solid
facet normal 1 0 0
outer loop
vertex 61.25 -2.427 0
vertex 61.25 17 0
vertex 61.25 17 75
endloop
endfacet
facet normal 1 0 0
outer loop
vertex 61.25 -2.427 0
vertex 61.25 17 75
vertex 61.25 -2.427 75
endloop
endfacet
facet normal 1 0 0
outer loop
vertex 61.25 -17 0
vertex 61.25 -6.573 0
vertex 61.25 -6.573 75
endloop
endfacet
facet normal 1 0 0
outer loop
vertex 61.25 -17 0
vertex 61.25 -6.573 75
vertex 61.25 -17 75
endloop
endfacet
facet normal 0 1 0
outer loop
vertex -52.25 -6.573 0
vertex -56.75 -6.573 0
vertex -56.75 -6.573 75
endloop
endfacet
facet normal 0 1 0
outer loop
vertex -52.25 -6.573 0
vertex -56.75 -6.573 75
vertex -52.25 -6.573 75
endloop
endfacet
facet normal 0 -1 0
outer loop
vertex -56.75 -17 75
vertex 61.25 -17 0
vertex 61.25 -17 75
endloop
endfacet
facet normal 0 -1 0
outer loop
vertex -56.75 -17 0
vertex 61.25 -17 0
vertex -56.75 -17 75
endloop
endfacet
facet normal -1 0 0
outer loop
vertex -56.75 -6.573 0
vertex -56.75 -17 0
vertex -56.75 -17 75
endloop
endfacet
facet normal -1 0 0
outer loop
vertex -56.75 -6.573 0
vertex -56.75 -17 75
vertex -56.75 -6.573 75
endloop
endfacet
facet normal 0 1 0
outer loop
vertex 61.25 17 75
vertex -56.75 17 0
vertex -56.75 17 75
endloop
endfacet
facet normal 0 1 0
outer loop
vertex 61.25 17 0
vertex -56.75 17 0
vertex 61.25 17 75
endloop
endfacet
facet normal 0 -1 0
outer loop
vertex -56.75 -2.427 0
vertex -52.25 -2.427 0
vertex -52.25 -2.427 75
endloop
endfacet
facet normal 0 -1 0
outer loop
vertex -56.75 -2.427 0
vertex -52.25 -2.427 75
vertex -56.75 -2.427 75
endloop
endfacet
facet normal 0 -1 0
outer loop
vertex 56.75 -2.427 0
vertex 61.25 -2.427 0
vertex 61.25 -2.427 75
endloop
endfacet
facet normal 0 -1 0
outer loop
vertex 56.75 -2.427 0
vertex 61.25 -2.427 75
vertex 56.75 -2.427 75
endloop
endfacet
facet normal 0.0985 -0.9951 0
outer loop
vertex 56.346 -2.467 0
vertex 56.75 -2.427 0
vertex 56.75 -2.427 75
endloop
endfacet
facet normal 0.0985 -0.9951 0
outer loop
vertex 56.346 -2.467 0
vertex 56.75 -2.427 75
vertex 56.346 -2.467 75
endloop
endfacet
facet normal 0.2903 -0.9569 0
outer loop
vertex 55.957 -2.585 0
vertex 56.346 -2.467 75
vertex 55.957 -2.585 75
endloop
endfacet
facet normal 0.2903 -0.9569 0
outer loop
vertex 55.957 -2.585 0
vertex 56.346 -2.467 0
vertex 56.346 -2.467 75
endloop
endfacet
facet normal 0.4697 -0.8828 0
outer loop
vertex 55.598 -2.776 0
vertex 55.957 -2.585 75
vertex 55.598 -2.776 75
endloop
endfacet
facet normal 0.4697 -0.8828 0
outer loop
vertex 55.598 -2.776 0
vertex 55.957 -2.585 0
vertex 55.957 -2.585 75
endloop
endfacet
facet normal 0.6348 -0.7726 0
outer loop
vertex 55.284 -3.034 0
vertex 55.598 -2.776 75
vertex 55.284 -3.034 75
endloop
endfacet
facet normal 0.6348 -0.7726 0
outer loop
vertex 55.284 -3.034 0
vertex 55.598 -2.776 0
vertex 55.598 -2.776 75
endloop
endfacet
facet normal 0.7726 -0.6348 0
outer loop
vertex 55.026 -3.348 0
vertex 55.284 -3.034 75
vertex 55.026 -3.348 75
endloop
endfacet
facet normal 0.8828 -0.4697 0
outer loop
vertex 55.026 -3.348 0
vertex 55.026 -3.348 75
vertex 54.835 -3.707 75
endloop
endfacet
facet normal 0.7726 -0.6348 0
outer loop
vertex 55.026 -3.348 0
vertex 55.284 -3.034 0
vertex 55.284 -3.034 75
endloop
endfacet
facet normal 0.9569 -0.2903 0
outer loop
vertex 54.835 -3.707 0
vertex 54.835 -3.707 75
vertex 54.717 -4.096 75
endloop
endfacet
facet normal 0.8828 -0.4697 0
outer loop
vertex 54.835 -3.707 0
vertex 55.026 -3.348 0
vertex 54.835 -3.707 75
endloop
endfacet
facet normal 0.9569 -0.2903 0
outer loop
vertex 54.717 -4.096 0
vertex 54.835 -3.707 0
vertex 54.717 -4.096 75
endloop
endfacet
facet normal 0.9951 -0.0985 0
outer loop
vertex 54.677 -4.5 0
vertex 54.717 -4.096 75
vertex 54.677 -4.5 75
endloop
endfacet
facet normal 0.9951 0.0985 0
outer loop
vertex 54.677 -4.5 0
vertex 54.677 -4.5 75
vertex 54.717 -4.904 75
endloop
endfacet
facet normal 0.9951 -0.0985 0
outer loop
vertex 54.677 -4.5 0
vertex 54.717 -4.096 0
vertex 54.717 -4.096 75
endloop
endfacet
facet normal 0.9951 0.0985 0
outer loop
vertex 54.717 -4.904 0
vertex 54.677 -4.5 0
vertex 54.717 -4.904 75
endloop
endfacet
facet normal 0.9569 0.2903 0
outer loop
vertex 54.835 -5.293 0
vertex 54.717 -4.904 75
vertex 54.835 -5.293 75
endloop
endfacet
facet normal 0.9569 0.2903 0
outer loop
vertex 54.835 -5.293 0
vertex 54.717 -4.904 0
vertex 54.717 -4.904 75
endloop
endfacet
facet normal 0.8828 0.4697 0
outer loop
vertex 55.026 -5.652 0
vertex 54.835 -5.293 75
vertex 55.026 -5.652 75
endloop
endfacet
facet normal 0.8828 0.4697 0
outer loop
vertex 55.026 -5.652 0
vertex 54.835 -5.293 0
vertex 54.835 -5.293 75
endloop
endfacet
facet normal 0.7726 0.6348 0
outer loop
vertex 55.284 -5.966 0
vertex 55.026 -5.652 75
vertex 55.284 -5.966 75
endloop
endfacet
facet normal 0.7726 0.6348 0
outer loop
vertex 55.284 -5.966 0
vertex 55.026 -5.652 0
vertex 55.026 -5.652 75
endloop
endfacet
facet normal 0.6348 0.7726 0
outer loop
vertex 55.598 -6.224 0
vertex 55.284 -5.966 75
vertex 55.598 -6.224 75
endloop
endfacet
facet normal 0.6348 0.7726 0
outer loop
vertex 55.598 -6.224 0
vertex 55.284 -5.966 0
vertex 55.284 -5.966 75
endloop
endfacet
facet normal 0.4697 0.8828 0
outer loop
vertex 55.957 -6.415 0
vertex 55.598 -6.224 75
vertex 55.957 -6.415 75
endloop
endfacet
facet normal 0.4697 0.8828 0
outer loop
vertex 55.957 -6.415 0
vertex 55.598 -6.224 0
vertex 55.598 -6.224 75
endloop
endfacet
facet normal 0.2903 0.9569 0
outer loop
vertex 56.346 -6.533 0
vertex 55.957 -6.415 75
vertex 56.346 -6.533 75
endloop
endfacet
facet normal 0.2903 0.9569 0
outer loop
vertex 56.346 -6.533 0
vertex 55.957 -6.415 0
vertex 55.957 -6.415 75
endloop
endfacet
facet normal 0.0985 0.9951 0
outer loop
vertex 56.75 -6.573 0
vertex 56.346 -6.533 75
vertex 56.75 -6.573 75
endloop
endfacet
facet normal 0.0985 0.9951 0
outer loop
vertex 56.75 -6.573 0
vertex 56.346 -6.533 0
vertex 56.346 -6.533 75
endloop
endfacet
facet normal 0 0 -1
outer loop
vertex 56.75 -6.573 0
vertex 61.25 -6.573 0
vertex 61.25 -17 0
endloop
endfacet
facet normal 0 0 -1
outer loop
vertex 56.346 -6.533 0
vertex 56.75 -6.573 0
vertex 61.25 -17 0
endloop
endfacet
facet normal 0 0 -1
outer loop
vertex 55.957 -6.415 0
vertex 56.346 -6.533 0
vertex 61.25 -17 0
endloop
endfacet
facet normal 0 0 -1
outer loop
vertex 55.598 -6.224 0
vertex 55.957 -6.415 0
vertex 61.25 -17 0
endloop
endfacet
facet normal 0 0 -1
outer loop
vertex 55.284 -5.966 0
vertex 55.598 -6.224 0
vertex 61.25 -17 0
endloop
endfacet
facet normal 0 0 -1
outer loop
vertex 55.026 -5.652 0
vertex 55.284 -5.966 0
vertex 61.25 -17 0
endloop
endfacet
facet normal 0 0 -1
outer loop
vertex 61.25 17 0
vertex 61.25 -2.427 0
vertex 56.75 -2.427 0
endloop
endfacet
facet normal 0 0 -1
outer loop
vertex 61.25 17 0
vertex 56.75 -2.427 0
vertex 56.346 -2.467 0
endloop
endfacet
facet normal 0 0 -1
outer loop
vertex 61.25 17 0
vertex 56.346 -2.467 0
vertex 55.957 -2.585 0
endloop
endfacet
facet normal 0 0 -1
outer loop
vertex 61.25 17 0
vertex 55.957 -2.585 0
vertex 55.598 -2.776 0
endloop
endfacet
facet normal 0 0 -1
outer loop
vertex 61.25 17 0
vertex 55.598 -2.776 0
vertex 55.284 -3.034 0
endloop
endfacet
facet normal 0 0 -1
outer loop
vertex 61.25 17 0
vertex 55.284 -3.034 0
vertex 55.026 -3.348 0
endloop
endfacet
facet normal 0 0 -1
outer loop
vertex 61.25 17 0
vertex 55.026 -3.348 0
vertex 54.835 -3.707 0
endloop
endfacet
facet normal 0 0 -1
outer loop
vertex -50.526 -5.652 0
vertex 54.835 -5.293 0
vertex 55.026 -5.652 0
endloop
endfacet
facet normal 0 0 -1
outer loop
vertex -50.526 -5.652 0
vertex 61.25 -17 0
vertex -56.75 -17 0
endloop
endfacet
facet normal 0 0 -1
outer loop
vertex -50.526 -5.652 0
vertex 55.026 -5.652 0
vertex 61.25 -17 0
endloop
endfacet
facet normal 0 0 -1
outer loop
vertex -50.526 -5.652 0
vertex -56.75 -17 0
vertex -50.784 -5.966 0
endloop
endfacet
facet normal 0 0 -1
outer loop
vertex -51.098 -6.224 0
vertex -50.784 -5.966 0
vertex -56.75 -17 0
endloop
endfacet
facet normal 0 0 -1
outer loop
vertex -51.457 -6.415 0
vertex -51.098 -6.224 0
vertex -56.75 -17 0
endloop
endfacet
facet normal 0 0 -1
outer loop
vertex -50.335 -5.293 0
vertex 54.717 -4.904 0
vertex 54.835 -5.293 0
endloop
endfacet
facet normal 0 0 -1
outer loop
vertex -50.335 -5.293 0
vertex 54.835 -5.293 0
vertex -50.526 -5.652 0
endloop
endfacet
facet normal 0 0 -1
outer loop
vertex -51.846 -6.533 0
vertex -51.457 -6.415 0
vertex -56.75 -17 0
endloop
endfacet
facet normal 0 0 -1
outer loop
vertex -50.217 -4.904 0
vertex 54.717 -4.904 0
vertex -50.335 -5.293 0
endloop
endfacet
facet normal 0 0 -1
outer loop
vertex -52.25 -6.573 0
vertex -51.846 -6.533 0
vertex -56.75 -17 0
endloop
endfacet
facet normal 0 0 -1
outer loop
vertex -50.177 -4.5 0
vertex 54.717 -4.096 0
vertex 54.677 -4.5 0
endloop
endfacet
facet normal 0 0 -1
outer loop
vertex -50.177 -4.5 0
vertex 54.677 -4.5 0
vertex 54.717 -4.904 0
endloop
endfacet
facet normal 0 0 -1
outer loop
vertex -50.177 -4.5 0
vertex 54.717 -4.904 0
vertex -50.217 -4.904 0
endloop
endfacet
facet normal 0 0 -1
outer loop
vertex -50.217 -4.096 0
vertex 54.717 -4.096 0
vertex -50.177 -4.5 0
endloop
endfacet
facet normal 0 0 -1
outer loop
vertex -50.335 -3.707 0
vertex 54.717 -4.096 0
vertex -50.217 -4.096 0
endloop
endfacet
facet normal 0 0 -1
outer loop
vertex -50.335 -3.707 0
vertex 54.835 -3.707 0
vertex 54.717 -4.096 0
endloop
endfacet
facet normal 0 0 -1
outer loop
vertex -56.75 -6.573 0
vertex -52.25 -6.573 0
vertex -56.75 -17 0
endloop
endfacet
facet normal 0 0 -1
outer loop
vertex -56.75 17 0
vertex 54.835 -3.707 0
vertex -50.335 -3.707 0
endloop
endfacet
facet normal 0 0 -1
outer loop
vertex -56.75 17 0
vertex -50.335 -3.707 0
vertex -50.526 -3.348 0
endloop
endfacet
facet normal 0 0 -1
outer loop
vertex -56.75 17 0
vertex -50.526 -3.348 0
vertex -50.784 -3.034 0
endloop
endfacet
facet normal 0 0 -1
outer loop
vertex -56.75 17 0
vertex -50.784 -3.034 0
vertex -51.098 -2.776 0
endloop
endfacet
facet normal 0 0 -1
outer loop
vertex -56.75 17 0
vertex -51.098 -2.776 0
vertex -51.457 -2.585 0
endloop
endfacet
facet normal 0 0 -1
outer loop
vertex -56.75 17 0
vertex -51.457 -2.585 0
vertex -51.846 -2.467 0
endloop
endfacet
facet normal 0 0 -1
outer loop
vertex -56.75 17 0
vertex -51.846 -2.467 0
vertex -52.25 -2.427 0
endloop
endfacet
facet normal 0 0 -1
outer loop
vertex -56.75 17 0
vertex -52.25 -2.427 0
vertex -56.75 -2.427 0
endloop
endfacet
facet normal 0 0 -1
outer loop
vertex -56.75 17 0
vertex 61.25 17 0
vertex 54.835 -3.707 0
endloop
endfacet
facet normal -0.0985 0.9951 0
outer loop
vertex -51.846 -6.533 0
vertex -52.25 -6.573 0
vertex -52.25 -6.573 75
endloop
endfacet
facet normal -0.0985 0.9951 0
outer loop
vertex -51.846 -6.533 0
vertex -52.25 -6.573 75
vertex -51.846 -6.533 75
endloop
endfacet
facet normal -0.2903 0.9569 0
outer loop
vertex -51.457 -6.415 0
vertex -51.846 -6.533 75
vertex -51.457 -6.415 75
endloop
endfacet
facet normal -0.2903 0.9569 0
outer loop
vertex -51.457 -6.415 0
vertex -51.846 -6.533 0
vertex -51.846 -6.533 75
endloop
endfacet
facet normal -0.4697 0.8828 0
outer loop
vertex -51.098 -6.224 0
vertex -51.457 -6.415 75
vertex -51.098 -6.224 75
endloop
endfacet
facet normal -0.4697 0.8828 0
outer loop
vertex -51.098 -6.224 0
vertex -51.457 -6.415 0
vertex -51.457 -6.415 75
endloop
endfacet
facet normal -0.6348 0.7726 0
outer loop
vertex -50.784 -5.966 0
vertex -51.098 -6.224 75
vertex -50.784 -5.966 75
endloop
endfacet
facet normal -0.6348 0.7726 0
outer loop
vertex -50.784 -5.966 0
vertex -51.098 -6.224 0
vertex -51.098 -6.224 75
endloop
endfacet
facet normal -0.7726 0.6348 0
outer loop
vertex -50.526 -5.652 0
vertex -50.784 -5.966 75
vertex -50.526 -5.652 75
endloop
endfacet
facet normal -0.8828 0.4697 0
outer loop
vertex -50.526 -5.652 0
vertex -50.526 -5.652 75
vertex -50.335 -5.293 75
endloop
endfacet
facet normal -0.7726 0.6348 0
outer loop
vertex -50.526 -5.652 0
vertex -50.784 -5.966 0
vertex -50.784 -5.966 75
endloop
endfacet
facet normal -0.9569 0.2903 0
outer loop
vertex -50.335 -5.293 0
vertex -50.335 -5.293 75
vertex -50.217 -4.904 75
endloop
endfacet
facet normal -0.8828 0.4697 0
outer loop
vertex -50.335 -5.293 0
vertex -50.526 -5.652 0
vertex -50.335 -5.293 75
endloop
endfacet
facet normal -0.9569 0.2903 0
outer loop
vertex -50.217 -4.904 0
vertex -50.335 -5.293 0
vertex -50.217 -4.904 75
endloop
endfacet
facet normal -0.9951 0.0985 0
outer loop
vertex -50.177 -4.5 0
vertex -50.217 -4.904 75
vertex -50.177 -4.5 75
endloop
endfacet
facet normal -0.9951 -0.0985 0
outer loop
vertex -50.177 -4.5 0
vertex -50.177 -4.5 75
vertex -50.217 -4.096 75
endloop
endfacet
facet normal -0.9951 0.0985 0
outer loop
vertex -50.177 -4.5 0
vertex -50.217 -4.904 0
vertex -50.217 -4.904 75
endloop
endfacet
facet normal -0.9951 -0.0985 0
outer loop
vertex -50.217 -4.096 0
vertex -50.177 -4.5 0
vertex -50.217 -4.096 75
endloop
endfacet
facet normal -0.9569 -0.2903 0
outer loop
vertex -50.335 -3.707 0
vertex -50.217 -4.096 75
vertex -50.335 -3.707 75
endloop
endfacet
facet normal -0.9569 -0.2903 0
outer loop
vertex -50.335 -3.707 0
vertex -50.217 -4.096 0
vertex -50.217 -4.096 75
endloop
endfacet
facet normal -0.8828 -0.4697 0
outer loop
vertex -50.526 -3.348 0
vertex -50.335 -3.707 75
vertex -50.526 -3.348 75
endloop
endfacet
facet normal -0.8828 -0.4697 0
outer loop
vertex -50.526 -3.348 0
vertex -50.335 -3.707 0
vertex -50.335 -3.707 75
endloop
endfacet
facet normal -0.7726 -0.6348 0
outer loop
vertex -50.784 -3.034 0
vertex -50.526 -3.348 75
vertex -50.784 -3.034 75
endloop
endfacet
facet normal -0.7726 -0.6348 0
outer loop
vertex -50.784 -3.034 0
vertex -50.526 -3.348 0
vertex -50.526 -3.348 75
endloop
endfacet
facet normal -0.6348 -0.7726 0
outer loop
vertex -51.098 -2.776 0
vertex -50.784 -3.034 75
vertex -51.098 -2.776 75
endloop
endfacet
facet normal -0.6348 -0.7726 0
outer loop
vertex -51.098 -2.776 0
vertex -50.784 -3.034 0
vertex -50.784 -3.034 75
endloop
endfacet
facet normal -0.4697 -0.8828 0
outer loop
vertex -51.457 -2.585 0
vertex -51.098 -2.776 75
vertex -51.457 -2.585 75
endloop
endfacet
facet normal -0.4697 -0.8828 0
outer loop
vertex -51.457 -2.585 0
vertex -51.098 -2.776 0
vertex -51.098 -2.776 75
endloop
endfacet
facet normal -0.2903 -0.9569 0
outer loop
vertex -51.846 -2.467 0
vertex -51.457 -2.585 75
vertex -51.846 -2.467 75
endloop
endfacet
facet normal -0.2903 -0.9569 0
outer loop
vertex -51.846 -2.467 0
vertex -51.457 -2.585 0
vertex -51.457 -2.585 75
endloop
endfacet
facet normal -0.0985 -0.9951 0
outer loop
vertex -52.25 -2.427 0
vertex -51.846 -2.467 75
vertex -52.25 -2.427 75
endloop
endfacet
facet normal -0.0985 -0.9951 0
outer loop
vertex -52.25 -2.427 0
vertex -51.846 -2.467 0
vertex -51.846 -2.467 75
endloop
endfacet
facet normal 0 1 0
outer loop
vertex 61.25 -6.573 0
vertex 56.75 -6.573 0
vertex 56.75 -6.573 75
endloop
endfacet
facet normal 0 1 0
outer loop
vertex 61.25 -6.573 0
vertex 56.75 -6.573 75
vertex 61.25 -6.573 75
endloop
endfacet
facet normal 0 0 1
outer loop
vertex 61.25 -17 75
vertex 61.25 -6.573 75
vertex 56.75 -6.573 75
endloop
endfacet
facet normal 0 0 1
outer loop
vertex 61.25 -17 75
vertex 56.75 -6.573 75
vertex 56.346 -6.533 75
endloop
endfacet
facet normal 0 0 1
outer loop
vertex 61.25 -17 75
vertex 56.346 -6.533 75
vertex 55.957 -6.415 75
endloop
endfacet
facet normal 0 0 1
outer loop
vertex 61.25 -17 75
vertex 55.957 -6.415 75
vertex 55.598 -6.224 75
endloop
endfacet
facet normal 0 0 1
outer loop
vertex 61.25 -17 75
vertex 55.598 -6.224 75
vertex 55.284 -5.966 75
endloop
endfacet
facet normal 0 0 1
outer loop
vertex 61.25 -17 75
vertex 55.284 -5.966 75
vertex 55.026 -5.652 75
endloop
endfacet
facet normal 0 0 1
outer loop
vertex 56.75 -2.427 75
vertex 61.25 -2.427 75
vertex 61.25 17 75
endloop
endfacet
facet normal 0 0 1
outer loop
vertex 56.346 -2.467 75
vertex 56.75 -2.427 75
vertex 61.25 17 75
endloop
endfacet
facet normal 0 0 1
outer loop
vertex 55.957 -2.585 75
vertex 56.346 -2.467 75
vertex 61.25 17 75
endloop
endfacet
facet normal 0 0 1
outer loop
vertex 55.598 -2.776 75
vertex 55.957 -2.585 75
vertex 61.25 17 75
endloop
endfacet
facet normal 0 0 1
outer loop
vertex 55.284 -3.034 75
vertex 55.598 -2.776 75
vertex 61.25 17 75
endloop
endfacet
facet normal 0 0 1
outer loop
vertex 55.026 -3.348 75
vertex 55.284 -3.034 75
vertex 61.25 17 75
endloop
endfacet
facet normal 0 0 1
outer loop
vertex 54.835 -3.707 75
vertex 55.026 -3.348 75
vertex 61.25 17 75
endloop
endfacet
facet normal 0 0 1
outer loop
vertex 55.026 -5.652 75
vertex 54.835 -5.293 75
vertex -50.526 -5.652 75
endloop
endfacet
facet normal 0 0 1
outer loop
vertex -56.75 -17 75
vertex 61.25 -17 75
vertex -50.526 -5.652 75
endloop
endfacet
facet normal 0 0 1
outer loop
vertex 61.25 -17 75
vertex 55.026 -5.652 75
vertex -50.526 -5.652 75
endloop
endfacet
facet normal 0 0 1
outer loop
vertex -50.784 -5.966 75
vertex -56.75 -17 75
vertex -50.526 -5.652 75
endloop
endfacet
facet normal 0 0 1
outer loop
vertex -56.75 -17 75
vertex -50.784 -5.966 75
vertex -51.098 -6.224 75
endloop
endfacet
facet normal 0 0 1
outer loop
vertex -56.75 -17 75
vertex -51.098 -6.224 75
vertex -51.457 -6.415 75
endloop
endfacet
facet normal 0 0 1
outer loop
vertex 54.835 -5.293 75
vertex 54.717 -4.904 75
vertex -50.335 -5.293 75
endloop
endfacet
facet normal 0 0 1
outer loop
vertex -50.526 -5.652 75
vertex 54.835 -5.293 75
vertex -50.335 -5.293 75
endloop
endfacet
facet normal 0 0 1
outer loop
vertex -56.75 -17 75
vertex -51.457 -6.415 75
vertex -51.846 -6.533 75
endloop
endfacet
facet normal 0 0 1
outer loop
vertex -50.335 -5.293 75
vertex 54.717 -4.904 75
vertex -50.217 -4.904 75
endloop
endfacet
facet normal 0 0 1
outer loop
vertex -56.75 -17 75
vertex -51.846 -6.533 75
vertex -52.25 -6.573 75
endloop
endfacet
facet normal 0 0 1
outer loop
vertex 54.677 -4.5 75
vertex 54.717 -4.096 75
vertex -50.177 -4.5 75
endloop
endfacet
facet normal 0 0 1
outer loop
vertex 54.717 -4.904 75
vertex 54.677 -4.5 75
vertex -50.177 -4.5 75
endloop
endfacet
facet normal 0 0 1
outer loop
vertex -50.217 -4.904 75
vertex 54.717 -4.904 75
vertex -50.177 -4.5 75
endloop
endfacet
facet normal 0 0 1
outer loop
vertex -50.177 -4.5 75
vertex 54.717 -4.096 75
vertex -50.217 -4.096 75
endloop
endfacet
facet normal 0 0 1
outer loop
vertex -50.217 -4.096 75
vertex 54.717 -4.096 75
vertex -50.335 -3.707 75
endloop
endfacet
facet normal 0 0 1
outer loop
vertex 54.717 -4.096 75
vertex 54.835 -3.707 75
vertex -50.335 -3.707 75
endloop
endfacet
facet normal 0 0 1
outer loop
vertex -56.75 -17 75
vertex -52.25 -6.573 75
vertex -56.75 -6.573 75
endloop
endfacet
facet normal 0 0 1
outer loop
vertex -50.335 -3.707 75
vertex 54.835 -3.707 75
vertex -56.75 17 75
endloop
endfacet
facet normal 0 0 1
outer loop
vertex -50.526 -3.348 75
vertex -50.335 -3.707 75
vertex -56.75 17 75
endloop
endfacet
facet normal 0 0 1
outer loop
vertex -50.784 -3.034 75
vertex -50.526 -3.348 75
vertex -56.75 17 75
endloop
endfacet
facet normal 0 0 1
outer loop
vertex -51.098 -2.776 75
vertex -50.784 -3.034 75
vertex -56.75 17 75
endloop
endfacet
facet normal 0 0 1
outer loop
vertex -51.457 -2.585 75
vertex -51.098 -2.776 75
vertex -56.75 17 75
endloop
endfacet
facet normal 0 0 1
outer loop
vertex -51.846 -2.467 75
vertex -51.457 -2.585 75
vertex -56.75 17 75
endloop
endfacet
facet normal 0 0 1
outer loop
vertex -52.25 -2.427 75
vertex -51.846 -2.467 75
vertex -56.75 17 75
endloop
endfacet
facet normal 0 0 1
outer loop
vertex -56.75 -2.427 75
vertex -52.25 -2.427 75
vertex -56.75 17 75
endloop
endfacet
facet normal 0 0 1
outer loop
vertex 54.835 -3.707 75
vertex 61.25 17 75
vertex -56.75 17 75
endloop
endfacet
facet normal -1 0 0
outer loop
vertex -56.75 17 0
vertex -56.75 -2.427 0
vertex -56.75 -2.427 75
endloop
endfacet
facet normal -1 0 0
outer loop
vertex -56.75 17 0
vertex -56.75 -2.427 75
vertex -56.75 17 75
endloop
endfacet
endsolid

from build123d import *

# Parameters (mm, degrees)
ESTRUSIONE_ESTRUSIONE1_DEPTH = 75


with BuildPart() as part:
    # Schizzo1 → Estrusione-Estrusione1 (new body)
    with BuildSketch(Plane.XY):
        with BuildLine():
            Line((-56.75, 17), (61.25, 17))
            Line((61.25, 17), (61.25, -2.426773282))
            Line((61.25, -2.426773282), (56.75, -2.426773282))
            ThreePointArc((56.75, -2.426773282), (54.676773282, -4.5), (56.75, -6.573226718))
            Line((56.75, -6.573226718), (61.25, -6.573226718))
            Line((61.25, -6.573226718), (61.25, -17))
            Line((61.25, -17), (-56.75, -17))
            Line((-56.75, -17), (-56.75, -6.573226718))
            Line((-56.75, -6.573226718), (-52.25, -6.573226718))
            ThreePointArc((-52.25, -6.573226718), (-50.176773282, -4.5), (-52.25, -2.426773282))
            Line((-52.25, -2.426773282), (-56.75, -2.426773282))
            Line((-56.75, -2.426773282), (-56.75, 17))
        make_face()
    extrude(amount=ESTRUSIONE_ESTRUSIONE1_DEPTH)


solid = part.part
